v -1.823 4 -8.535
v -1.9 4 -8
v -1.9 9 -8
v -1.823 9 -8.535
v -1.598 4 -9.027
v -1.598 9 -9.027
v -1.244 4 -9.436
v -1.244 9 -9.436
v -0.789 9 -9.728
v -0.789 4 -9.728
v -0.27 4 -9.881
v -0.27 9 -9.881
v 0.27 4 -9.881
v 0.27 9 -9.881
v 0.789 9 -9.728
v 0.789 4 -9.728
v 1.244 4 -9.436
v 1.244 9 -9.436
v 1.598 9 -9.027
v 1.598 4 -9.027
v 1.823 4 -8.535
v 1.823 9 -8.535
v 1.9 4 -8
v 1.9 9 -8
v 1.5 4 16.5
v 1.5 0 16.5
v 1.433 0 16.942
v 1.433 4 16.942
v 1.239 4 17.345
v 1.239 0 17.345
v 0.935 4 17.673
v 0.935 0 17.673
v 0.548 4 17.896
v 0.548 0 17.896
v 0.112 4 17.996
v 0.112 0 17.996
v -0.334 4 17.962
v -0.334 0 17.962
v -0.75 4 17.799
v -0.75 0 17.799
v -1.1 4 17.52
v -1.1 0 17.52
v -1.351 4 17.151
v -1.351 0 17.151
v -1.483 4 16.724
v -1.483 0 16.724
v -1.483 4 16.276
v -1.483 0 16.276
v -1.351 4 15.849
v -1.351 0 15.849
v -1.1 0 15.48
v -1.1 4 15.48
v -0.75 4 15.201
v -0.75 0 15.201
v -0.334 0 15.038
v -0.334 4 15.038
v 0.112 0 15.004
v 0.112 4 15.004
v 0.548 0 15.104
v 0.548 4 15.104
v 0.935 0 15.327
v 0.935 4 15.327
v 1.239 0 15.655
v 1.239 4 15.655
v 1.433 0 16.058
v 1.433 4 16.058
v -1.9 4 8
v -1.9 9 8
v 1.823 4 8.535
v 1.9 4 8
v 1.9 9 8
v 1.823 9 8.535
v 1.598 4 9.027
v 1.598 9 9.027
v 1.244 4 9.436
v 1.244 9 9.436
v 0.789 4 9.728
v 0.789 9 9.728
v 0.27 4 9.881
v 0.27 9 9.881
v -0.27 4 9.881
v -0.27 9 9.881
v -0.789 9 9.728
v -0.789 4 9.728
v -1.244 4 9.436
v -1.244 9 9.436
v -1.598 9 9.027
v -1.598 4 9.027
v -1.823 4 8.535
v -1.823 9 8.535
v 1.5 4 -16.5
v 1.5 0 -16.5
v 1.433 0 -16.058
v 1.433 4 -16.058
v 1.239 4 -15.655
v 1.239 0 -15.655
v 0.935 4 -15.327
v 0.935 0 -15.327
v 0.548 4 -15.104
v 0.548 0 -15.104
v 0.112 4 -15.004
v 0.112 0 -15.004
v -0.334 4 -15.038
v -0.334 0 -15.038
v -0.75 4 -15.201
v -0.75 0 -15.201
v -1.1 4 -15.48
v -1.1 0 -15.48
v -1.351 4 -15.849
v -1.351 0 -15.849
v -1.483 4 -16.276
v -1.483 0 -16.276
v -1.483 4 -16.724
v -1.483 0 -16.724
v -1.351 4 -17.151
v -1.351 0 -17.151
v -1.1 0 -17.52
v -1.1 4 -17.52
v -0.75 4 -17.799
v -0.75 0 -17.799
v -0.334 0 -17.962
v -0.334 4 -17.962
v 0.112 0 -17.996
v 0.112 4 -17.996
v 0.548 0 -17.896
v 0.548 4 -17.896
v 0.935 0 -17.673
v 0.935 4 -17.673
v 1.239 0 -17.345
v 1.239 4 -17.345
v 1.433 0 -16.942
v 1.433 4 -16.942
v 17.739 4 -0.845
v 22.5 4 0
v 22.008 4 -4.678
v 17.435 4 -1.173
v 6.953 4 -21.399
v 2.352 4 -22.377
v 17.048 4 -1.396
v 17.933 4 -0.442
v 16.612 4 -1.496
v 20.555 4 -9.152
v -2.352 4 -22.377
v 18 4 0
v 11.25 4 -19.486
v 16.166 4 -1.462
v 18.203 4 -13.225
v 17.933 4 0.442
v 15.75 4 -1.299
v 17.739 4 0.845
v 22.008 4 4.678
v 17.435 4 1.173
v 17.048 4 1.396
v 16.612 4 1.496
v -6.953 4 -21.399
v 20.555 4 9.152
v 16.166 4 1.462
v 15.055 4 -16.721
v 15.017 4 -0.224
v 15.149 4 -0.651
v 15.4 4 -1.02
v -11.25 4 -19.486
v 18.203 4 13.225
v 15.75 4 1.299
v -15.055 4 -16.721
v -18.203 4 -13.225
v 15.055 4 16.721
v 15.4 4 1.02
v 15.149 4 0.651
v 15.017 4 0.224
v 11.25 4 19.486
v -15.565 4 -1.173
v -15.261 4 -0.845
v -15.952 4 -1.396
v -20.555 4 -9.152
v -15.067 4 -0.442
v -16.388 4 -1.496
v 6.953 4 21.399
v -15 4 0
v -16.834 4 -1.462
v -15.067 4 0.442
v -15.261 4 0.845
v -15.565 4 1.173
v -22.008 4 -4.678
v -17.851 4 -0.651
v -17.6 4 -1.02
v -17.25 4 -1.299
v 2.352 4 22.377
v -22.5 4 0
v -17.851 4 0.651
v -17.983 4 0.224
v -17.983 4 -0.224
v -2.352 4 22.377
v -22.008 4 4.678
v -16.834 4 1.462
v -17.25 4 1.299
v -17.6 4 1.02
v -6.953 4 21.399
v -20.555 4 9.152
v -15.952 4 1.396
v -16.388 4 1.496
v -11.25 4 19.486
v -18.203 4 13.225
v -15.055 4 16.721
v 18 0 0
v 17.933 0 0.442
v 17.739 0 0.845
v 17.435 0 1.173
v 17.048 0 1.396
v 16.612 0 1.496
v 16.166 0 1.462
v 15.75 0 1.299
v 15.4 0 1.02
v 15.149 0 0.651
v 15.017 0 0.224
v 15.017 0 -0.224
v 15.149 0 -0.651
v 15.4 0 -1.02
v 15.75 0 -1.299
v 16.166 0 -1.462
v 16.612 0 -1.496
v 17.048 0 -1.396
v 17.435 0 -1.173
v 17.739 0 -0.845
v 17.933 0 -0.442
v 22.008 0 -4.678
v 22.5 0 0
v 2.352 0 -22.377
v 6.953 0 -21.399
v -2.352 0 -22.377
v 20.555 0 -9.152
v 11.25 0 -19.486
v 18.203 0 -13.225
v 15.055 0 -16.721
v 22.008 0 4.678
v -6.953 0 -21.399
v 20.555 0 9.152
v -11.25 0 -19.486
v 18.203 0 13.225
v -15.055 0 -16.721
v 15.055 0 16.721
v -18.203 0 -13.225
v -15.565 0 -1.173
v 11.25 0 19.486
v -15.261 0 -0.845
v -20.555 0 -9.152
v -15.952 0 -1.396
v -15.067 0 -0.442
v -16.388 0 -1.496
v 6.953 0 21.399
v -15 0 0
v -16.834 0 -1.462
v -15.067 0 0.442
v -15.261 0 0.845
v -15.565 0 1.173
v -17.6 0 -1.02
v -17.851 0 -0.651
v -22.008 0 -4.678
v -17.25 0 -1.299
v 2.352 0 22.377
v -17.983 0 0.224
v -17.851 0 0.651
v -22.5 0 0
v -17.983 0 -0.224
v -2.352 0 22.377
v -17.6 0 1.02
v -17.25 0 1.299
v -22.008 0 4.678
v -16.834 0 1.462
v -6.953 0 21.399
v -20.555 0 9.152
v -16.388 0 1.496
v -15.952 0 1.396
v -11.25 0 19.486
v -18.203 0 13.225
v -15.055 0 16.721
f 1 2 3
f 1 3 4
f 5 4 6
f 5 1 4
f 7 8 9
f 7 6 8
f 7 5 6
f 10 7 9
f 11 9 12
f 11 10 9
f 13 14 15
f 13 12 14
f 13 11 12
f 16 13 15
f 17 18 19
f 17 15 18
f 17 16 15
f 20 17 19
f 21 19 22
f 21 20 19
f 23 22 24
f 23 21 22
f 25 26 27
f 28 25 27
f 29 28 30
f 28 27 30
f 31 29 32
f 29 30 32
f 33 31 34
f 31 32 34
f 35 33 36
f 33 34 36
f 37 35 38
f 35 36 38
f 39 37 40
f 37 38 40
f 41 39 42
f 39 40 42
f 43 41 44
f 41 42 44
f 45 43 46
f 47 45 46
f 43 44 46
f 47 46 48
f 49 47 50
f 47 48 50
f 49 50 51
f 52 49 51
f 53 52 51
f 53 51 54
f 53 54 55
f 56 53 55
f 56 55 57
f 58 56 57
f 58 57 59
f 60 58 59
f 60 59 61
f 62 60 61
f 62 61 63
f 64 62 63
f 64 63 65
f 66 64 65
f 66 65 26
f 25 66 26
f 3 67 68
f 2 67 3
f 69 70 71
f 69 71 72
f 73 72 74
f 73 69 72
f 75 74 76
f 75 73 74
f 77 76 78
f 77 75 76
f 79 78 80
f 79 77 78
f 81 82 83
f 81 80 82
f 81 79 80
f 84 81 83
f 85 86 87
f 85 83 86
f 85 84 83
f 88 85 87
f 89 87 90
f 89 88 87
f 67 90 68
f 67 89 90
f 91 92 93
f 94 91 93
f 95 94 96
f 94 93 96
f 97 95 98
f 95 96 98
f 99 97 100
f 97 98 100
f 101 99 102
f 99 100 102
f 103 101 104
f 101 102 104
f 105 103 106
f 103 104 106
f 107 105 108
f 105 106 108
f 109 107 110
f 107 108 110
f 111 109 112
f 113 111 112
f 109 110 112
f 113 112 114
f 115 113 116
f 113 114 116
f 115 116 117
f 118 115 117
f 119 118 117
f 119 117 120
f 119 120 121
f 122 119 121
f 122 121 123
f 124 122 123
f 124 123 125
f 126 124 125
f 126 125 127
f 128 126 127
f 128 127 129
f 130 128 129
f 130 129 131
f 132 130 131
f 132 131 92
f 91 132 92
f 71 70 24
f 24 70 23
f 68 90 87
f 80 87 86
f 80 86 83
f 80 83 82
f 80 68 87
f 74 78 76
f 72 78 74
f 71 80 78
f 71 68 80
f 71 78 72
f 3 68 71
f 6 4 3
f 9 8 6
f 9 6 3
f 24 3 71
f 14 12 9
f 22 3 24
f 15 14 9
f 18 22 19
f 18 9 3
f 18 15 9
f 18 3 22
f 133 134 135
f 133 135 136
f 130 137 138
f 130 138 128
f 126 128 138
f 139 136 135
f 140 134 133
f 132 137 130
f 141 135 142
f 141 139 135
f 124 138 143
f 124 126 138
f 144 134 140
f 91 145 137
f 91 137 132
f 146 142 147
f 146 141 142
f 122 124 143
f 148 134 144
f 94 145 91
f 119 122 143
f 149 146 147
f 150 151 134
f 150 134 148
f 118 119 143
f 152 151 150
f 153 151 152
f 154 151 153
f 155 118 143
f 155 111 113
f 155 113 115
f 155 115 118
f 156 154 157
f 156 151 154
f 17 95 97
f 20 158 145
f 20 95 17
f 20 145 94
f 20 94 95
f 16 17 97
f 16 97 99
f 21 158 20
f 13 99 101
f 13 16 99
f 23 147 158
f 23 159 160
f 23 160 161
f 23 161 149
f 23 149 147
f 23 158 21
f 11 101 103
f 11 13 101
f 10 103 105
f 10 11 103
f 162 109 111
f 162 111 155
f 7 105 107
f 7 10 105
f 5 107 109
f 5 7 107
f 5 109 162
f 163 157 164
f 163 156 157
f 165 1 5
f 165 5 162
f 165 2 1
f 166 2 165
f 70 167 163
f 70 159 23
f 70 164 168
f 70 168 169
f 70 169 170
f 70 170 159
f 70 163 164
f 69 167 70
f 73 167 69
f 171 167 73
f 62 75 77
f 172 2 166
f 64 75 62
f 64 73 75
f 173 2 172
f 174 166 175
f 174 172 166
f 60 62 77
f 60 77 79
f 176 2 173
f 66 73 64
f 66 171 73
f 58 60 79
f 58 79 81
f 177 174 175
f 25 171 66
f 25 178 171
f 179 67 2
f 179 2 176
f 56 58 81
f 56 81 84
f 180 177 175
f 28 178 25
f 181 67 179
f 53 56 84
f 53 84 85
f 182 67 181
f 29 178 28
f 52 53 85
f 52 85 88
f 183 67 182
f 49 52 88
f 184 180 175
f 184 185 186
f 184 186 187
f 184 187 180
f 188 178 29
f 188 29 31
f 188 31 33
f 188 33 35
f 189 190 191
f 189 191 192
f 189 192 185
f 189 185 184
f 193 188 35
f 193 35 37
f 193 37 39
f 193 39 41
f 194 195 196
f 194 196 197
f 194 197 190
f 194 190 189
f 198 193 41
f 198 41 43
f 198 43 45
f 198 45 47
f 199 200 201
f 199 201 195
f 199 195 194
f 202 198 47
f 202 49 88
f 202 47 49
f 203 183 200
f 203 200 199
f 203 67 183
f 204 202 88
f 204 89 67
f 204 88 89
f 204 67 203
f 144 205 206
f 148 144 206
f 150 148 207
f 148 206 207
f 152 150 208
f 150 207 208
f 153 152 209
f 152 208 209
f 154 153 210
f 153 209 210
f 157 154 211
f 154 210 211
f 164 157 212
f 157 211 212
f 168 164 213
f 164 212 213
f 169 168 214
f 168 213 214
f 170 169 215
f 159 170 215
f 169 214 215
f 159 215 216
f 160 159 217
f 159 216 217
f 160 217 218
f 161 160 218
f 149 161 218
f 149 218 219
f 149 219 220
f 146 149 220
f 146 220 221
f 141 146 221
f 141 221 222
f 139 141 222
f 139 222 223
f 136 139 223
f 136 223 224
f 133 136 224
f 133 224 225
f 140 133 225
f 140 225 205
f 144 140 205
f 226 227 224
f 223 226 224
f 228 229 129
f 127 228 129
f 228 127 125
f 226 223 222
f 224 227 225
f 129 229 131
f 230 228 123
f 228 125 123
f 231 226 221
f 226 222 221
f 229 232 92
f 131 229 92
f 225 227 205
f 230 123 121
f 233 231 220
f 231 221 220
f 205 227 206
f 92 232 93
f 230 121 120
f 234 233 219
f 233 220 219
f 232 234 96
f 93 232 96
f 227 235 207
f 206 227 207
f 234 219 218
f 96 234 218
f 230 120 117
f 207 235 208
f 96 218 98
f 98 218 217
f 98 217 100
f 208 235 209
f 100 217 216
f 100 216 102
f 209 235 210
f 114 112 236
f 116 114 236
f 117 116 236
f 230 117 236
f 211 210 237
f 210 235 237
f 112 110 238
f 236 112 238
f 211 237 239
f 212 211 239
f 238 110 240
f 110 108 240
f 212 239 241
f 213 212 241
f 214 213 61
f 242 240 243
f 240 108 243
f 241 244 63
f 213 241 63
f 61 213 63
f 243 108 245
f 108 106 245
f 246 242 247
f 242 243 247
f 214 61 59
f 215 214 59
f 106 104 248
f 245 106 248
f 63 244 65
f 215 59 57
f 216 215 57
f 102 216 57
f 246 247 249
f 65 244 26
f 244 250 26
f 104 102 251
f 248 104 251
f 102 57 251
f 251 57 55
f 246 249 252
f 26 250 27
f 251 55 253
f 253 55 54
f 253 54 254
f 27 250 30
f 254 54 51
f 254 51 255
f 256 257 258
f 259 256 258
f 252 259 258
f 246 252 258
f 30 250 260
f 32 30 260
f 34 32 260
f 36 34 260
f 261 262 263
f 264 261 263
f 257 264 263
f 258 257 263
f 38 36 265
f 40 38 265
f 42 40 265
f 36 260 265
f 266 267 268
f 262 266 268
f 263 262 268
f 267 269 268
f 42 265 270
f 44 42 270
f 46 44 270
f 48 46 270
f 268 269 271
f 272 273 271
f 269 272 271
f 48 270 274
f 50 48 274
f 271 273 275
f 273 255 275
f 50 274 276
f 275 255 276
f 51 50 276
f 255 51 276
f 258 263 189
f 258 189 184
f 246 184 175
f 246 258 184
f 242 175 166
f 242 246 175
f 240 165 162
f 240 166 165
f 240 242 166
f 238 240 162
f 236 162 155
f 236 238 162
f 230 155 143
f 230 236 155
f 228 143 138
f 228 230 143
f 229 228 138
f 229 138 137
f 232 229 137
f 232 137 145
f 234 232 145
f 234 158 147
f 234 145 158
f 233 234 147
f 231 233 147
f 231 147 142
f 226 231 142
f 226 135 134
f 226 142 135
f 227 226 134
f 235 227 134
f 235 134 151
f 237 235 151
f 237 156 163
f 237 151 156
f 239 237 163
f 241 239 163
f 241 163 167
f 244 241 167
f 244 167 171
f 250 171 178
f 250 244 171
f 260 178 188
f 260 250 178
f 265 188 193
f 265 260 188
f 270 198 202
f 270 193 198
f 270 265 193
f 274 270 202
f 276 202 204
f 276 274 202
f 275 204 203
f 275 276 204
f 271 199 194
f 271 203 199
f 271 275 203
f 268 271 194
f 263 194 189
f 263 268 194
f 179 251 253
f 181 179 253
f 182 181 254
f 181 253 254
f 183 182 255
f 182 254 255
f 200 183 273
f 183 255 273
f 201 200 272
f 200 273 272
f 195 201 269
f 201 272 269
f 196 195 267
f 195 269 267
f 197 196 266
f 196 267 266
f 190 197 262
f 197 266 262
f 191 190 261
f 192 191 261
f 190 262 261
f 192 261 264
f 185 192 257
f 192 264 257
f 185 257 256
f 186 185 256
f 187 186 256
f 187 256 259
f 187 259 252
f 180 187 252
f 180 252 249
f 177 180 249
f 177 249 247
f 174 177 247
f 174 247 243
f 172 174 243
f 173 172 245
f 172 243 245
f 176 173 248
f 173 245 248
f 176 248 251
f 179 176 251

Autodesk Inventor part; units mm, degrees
ref_plane "YZ Plane" through (0, 0, 0) normal (1, 0, 0) x (0, 1, 0)
ref_plane "XZ Plane" through (0, 0, 0) normal (0, 1, 0) x (-1, 0, 0)
ref_plane "XY Plane" through (0, 0, 0) normal (0, 0, 1) x (1, 0, 0)
sketch "Sketch1" plane through (0, 0, 0) normal (0, 1, 0) x (-1, 0, 0)
  circle A0 centre (0, 0) radius 22.5
  dimension "d0" = 45
extrude "Extrusion1" add sketch "Sketch1" along normal blind 4
sketch "Sketch2" plane through (0, 4, 0) normal (0, 1, 0) x (1, 0, 0)
  line L0 (0, 0) -> (0, 8) construction
  line L1 (0, 0) -> (0, -8) construction
  circle A0 centre (0, 8) radius 1.9
  circle A1 centre (0, 0) radius 1.9
  circle A2 centre (0, -8) radius 1.9
  line L2 (1.9, 0) -> (1.9, -8)
  line L3 (1.9, 0) -> (1.9, 8)
  line L4 (-1.9, -8) -> (-1.9, 0)
  line L5 (-1.9, 0) -> (-1.9, 8)
  dimension "d3" = 8
  dimension "d4" = 8
  dimension "d5" = 3.8
  dimension "d6" = 3.8
  dimension "d7" = 3.8
extrude "Extrusion2" add sketch "Sketch2" along normal blind 5
sketch "Sketch7" plane through (0, 0, 0) normal (0, -1, 0) x (1, 0, 0)
  circle A0 centre (0, 0) radius 16.5 construction
  circle A1 centre (0, 16.5) radius 1.5
  circle A2 centre (16.5, 0) radius 1.5
  circle A3 centre (-16.5, 0) radius 1.5
  circle A4 centre (0, -16.5) radius 1.5
  dimension "d42" = 33
  dimension "d43" = 3
  dimension "d44" = 3
  dimension "d45" = 3
  dimension "d46" = 3
extrude "Extrusion6" cut sketch "Sketch7" against normal blind 5
properties part number "motormount_v3_richard"
